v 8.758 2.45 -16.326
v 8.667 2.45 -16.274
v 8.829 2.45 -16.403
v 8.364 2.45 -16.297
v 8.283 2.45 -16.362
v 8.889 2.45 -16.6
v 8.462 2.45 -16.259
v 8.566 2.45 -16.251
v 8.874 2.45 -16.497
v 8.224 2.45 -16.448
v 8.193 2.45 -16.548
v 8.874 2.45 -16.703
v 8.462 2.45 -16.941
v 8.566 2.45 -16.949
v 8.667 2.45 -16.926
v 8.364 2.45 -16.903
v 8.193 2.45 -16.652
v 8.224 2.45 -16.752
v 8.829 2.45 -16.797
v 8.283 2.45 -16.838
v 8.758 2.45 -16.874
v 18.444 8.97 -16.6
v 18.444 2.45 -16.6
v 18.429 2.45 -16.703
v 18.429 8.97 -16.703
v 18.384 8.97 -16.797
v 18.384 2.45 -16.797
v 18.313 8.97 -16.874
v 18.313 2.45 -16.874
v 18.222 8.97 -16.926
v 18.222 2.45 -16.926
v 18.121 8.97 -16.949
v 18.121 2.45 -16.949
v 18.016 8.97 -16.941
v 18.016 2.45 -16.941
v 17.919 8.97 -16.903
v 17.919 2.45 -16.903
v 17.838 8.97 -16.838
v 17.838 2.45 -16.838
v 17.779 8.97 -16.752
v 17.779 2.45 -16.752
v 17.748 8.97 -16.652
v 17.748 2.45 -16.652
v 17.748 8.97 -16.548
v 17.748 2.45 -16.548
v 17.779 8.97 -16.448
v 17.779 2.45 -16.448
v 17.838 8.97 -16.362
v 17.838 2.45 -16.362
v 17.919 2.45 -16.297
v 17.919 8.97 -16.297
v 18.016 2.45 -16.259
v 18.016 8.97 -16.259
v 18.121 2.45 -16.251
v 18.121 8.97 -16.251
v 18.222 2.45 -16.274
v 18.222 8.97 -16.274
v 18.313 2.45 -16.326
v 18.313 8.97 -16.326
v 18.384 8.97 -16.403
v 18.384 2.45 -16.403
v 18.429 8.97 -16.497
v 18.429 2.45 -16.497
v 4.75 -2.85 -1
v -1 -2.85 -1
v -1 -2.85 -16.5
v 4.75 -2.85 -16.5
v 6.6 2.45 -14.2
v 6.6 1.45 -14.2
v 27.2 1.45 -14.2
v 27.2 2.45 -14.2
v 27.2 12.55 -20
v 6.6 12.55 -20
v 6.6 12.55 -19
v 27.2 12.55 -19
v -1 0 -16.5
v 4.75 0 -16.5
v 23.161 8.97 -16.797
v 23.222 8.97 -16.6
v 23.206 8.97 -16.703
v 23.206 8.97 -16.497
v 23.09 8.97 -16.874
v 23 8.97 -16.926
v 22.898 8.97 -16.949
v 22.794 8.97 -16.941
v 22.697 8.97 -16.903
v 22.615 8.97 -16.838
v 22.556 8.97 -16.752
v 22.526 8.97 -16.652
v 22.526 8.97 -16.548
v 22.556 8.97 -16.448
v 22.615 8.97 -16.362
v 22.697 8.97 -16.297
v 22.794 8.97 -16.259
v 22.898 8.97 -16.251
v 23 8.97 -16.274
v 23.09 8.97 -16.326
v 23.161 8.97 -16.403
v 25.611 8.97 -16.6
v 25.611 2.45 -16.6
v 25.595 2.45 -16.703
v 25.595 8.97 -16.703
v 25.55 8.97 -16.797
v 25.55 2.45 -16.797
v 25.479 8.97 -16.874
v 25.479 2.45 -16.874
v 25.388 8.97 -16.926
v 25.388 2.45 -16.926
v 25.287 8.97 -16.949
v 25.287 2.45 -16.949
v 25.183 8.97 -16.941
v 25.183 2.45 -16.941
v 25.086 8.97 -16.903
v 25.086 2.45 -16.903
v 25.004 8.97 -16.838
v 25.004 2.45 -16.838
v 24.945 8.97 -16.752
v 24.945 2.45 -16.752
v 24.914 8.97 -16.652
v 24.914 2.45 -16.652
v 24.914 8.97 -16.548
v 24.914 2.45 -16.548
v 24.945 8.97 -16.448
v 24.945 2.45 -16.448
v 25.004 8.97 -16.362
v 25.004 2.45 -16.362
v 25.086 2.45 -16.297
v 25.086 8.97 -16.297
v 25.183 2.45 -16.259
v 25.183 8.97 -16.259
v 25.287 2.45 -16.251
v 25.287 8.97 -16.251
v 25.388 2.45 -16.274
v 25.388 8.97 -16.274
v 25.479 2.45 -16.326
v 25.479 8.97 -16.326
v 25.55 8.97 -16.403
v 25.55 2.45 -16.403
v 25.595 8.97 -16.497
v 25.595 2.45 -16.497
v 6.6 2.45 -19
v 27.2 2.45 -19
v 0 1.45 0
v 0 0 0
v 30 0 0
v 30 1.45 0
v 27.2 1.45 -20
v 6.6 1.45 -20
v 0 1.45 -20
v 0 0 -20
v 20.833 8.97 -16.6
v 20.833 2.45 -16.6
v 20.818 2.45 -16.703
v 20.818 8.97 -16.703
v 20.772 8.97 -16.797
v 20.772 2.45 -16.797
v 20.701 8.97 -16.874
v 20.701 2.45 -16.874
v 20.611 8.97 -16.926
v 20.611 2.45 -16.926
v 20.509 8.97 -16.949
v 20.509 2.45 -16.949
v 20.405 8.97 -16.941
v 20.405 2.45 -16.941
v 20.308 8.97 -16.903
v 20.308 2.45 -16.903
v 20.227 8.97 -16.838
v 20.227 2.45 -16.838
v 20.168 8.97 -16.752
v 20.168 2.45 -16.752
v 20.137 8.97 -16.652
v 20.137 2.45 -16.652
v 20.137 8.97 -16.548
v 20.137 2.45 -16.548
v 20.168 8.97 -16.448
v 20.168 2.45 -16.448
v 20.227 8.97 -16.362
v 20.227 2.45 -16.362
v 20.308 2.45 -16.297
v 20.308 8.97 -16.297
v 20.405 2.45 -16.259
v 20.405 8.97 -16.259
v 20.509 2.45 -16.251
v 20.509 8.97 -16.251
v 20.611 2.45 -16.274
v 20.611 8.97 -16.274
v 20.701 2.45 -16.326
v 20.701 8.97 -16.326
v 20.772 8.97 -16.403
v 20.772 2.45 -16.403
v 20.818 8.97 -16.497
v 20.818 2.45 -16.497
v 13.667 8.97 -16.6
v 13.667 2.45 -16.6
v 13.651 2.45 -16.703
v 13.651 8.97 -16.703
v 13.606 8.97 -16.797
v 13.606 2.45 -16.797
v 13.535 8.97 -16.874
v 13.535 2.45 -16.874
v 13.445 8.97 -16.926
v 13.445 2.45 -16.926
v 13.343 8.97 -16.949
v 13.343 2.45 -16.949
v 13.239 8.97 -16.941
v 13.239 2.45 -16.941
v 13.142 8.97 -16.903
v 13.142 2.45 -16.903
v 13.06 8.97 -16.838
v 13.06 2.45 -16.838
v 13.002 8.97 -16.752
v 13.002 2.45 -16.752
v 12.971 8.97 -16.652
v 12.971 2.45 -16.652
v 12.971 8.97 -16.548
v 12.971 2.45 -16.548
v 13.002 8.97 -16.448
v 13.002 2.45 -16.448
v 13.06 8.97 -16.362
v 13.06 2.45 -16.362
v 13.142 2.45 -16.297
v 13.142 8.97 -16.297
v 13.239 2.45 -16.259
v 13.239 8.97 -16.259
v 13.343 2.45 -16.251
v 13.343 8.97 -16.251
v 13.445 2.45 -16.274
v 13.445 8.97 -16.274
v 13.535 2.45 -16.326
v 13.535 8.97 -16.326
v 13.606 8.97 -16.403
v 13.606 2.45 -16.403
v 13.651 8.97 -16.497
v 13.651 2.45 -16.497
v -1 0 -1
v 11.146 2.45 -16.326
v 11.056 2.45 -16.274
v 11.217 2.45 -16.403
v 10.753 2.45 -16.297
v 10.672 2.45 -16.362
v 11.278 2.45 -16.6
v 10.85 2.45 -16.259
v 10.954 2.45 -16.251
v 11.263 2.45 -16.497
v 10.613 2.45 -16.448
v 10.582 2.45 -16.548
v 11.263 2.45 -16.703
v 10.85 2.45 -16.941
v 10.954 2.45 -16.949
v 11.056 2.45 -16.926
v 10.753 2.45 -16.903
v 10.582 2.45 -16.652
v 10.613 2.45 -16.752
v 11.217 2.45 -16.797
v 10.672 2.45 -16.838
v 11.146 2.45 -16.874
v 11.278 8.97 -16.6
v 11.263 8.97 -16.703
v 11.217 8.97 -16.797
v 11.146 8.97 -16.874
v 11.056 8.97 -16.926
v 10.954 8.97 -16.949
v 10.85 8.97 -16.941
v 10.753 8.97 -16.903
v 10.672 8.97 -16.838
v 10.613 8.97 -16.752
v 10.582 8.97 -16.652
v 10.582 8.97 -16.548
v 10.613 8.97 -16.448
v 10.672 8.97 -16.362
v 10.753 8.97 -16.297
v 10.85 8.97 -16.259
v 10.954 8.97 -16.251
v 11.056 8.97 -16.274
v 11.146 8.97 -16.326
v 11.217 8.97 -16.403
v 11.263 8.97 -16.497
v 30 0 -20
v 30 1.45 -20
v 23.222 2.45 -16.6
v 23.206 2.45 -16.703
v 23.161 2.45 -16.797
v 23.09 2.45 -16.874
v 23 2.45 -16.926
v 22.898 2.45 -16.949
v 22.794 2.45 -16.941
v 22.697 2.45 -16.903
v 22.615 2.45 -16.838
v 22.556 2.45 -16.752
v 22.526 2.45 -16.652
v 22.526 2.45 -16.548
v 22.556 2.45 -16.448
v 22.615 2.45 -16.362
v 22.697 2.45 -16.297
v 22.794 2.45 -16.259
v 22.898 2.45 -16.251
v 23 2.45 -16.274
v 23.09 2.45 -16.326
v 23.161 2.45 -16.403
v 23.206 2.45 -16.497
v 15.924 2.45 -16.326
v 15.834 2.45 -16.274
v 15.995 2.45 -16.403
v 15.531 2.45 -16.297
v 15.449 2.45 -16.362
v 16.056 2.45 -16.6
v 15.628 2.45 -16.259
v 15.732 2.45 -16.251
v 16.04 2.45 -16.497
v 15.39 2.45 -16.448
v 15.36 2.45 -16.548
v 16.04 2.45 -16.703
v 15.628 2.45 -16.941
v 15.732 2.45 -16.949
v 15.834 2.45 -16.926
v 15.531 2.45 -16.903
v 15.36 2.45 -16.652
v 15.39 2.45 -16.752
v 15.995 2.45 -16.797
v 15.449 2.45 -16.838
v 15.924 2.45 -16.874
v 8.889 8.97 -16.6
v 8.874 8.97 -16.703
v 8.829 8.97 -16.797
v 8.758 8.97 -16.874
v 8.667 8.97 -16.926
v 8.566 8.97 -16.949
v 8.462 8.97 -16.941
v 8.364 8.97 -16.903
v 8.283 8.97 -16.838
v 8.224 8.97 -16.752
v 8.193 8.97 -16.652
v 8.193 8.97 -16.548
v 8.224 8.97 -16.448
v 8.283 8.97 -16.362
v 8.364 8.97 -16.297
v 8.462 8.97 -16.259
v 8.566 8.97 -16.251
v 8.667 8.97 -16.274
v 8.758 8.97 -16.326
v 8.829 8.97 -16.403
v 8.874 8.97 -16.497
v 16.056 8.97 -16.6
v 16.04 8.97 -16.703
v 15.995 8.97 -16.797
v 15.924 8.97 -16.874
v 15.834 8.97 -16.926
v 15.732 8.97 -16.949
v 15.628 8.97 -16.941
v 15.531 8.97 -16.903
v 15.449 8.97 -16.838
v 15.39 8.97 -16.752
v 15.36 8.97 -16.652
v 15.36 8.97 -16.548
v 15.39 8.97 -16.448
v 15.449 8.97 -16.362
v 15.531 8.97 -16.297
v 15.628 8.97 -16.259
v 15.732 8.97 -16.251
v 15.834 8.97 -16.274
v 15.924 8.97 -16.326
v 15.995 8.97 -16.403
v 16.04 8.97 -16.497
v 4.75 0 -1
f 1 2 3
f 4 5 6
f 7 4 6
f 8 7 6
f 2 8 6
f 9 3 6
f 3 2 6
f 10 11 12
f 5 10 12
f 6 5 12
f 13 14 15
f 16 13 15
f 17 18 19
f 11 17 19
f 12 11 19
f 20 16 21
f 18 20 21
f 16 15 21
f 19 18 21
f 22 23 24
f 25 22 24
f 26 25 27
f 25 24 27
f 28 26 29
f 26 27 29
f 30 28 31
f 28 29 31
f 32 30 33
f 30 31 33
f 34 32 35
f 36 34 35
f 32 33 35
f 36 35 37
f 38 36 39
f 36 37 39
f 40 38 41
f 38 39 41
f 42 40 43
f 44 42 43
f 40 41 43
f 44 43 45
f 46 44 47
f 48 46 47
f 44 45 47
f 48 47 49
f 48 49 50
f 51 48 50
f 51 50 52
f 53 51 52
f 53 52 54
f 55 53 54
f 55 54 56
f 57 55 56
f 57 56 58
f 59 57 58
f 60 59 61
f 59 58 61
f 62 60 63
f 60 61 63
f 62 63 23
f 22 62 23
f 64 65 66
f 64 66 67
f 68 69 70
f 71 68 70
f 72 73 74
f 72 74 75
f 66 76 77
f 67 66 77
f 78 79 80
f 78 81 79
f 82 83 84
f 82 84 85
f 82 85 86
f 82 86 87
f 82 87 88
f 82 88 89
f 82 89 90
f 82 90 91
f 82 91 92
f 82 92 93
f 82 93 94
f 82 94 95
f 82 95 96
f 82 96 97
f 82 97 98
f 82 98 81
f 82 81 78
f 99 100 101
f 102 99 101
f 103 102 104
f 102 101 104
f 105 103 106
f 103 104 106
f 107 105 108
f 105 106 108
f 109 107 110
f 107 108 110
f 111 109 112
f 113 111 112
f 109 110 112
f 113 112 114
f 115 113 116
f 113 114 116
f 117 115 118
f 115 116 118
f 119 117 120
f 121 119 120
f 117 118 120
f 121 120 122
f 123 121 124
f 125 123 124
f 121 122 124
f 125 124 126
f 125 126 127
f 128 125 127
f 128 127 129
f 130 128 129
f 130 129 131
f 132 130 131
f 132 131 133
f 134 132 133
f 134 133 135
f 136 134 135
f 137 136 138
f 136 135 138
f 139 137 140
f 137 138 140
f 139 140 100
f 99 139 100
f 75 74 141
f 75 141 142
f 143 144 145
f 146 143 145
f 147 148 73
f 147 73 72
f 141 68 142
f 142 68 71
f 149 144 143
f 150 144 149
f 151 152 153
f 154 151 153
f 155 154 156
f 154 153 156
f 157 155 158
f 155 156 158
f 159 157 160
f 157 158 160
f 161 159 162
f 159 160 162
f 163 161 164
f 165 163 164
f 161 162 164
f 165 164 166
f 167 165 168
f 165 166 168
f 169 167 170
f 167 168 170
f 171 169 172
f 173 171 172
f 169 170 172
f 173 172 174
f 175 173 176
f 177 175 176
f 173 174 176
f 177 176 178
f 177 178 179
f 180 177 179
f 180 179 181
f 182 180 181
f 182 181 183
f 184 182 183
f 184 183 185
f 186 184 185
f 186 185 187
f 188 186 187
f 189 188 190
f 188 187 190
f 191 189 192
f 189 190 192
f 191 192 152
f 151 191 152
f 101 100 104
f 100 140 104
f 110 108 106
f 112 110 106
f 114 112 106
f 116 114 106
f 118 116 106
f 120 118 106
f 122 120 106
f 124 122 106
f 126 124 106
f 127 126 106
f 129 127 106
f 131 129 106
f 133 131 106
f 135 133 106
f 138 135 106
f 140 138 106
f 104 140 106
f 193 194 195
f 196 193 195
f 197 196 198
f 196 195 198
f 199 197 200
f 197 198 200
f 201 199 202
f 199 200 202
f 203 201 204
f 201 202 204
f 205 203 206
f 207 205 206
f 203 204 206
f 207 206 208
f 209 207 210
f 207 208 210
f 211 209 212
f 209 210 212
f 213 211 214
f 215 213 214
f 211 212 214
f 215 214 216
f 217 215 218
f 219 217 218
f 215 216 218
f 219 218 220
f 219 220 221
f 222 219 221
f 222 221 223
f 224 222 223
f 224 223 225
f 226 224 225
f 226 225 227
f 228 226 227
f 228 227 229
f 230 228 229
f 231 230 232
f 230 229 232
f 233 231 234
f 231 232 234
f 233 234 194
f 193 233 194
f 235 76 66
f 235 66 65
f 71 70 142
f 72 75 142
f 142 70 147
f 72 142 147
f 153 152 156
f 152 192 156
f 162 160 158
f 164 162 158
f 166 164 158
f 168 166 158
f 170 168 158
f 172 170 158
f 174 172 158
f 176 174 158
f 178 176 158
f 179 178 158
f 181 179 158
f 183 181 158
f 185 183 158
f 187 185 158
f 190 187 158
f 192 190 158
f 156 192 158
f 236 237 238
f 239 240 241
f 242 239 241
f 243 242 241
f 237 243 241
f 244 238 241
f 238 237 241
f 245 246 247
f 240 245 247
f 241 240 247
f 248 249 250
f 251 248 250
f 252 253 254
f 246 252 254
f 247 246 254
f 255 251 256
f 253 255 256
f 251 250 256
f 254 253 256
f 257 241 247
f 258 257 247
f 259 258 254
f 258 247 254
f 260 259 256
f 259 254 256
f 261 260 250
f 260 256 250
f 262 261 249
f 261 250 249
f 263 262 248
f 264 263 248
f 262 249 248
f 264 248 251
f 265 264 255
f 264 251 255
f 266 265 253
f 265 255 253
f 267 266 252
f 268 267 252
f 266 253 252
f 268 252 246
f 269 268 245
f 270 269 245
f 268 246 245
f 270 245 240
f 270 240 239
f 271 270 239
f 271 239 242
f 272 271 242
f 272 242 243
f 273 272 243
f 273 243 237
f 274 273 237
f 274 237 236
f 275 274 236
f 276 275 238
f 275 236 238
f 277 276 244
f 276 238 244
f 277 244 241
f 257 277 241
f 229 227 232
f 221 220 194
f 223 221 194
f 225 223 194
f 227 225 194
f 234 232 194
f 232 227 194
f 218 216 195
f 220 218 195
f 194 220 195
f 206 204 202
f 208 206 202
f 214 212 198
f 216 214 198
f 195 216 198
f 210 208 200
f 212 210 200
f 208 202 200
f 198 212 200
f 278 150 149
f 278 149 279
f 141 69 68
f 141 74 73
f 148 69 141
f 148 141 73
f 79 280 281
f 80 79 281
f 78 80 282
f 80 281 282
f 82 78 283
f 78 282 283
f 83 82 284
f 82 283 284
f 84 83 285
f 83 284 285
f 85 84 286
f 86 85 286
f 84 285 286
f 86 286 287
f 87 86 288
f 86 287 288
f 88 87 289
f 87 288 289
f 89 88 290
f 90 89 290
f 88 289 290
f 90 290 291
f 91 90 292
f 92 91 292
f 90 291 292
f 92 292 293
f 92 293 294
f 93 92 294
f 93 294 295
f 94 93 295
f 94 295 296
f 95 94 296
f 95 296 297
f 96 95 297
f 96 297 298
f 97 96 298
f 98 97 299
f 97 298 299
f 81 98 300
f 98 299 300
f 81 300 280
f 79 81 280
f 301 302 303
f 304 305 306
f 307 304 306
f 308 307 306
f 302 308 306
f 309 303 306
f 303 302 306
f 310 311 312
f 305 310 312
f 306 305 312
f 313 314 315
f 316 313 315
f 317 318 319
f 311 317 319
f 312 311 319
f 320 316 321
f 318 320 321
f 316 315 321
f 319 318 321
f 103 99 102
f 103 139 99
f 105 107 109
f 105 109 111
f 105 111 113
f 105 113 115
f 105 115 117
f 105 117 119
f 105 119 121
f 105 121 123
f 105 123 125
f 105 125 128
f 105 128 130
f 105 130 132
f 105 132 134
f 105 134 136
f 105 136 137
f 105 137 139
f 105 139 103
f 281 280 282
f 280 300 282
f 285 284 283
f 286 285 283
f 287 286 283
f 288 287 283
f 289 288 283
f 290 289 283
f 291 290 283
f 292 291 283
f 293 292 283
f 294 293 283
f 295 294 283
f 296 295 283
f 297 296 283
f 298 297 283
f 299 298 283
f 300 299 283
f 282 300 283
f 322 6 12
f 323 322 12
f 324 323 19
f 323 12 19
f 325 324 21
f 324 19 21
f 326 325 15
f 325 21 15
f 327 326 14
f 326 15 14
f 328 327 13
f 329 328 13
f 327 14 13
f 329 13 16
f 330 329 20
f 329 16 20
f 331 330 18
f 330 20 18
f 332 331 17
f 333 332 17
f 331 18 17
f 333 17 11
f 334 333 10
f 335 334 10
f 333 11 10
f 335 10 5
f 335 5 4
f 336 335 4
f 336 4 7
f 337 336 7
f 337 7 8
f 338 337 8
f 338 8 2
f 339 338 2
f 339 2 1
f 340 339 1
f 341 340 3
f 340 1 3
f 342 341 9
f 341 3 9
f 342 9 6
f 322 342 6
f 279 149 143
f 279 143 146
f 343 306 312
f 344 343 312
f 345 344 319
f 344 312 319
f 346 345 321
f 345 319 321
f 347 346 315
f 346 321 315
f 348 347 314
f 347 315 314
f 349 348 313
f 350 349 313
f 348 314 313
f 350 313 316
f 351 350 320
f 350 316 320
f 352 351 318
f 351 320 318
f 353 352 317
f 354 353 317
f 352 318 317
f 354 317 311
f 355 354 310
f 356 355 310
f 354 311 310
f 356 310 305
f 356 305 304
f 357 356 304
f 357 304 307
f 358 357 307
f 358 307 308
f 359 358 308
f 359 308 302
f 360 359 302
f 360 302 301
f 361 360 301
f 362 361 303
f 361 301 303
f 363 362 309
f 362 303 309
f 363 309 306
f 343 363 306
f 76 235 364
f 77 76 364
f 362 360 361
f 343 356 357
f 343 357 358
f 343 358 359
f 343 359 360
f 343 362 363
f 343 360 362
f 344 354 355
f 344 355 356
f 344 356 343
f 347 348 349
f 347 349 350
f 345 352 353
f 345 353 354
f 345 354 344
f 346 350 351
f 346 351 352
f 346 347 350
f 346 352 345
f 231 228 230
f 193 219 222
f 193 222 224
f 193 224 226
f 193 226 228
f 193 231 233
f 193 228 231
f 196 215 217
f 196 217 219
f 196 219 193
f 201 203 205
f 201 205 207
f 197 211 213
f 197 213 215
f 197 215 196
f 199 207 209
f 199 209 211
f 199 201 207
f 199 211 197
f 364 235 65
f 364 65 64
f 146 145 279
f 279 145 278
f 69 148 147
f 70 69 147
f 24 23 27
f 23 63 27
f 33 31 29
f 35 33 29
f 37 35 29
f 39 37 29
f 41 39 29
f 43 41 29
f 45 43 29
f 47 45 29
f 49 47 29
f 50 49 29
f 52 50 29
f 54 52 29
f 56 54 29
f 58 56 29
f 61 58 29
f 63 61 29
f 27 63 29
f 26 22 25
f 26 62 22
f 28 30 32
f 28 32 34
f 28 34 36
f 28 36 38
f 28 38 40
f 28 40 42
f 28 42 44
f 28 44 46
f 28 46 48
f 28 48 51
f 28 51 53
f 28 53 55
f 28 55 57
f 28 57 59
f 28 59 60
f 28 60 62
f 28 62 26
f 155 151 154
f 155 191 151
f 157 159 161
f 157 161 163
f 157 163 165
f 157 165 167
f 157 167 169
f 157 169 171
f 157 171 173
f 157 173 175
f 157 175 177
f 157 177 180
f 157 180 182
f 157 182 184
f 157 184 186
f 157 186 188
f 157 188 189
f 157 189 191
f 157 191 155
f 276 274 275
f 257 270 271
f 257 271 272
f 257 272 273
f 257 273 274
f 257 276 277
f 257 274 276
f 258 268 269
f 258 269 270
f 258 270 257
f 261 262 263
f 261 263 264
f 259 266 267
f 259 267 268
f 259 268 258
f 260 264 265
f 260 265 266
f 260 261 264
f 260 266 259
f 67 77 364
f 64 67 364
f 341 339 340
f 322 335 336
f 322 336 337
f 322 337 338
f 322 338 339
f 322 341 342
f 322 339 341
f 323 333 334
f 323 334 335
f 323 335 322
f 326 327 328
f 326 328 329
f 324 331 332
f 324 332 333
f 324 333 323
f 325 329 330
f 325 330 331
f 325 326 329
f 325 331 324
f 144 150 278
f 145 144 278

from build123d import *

# Parameters (mm, degrees)
SKETCH1_W             = 30
SKETCH1_H             = 20
BOSS_EXTRUDE1_DEPTH   = 1.45
SKETCH2_W             = 20.6
SKETCH2_H             = 5.8
BOSS_EXTRUDE2_DEPTH   = 11.1
SKETCH4_W             = 5.75
SKETCH4_H             = 15.5
BOSS_EXTRUDE3_DEPTH   = 2.85
SKETCH5_W             = 20.6
SKETCH5_H             = 10.1
CUT_EXTRUDE1_DEPTH    = 4.8
SKETCH6_R             = 0.35
BOSS_EXTRUDE4_DEPTH   = 6.52
BOSS_EXTRUDE4_2_DEPTH = 6.52
BOSS_EXTRUDE4_3_DEPTH = 6.52
BOSS_EXTRUDE4_4_DEPTH = 6.52
BOSS_EXTRUDE4_5_DEPTH = 6.52
BOSS_EXTRUDE4_6_DEPTH = 6.52
BOSS_EXTRUDE4_7_DEPTH = 6.52
BOSS_EXTRUDE4_8_DEPTH = 6.52


with BuildPart() as part:
    # Sketch1 → Boss-Extrude1 (new body)
    with BuildSketch(Plane(origin=(0, 0, 0), x_dir=(1, 0, 0), z_dir=(0, 1, 0))):
        with Locations((15, 10)):
            Rectangle(SKETCH1_W, SKETCH1_H)
    extrude(amount=BOSS_EXTRUDE1_DEPTH)


with BuildPart() as body_2:
    # Sketch2 → Boss-Extrude2 (new body)
    with BuildSketch(Plane(origin=(0, 1.45, 0), x_dir=(1, 0, 0), z_dir=(0, 1, 0))):
        with Locations((16.9, 17.1)):
            Rectangle(SKETCH2_W, SKETCH2_H)
    extrude(amount=BOSS_EXTRUDE2_DEPTH)

    # Sketch5 → Cut-Extrude1 (cut)
    with BuildSketch(Plane.XY.offset(-14.2)):
        with Locations((16.9, 7.5)):
            Rectangle(SKETCH5_W, SKETCH5_H)
    extrude(amount=-CUT_EXTRUDE1_DEPTH, mode=Mode.SUBTRACT)


with BuildPart() as body_3:
    # Sketch4 → Boss-Extrude3 (new body)
    with BuildSketch(Plane.XZ):
        with Locations((1.875, -8.75)):
            Rectangle(SKETCH4_W, SKETCH4_H)
    extrude(amount=BOSS_EXTRUDE3_DEPTH)


with BuildPart() as body_4:
    # Sketch6 → Boss-Extrude4 (new body)
    with BuildSketch(Plane(origin=(0, 2.45, 0), x_dir=(1, 0, 0), z_dir=(0, 1, 0))):
        with Locations((8.539449329, 16.6)):
            Circle(SKETCH6_R)
    extrude(amount=BOSS_EXTRUDE4_DEPTH)


with BuildPart() as body_5:
    # Sketch6 → Boss-Extrude4 2 (new body)
    with BuildSketch(Plane(origin=(0, 2.45, 0), x_dir=(1, 0, 0), z_dir=(0, 1, 0))):
        with Locations((10.928178092, 16.6)):
            Circle(SKETCH6_R)
    extrude(amount=BOSS_EXTRUDE4_2_DEPTH)


with BuildPart() as body_6:
    # Sketch6 → Boss-Extrude4 3 (new body)
    with BuildSketch(Plane(origin=(0, 2.45, 0), x_dir=(1, 0, 0), z_dir=(0, 1, 0))):
        with Locations((13.316906855, 16.6)):
            Circle(SKETCH6_R)
    extrude(amount=BOSS_EXTRUDE4_3_DEPTH)


with BuildPart() as body_7:
    # Sketch6 → Boss-Extrude4 4 (new body)
    with BuildSketch(Plane(origin=(0, 2.45, 0), x_dir=(1, 0, 0), z_dir=(0, 1, 0))):
        with Locations((15.705635618, 16.6)):
            Circle(SKETCH6_R)
    extrude(amount=BOSS_EXTRUDE4_4_DEPTH)


with BuildPart() as body_8:
    # Sketch6 → Boss-Extrude4 5 (new body)
    with BuildSketch(Plane(origin=(0, 2.45, 0), x_dir=(1, 0, 0), z_dir=(0, 1, 0))):
        with Locations((18.094364382, 16.6)):
            Circle(SKETCH6_R)
    extrude(amount=BOSS_EXTRUDE4_5_DEPTH)


with BuildPart() as body_9:
    # Sketch6 → Boss-Extrude4 6 (new body)
    with BuildSketch(Plane(origin=(0, 2.45, 0), x_dir=(1, 0, 0), z_dir=(0, 1, 0))):
        with Locations((20.483093145, 16.6)):
            Circle(SKETCH6_R)
    extrude(amount=BOSS_EXTRUDE4_6_DEPTH)


with BuildPart() as body_10:
    # Sketch6 → Boss-Extrude4 7 (new body)
    with BuildSketch(Plane(origin=(0, 2.45, 0), x_dir=(1, 0, 0), z_dir=(0, 1, 0))):
        with Locations((22.871821908, 16.6)):
            Circle(SKETCH6_R)
    extrude(amount=BOSS_EXTRUDE4_7_DEPTH)


with BuildPart() as body_11:
    # Sketch6 → Boss-Extrude4 8 (new body)
    with BuildSketch(Plane(origin=(0, 2.45, 0), x_dir=(1, 0, 0), z_dir=(0, 1, 0))):
        with Locations((25.260550671, 16.6)):
            Circle(SKETCH6_R)
    extrude(amount=BOSS_EXTRUDE4_8_DEPTH)


solid = Compound([part.part, body_2.part, body_3.part, body_4.part, body_5.part, body_6.part, body_7.part, body_8.part, body_9.part, body_10.part, body_11.part])
